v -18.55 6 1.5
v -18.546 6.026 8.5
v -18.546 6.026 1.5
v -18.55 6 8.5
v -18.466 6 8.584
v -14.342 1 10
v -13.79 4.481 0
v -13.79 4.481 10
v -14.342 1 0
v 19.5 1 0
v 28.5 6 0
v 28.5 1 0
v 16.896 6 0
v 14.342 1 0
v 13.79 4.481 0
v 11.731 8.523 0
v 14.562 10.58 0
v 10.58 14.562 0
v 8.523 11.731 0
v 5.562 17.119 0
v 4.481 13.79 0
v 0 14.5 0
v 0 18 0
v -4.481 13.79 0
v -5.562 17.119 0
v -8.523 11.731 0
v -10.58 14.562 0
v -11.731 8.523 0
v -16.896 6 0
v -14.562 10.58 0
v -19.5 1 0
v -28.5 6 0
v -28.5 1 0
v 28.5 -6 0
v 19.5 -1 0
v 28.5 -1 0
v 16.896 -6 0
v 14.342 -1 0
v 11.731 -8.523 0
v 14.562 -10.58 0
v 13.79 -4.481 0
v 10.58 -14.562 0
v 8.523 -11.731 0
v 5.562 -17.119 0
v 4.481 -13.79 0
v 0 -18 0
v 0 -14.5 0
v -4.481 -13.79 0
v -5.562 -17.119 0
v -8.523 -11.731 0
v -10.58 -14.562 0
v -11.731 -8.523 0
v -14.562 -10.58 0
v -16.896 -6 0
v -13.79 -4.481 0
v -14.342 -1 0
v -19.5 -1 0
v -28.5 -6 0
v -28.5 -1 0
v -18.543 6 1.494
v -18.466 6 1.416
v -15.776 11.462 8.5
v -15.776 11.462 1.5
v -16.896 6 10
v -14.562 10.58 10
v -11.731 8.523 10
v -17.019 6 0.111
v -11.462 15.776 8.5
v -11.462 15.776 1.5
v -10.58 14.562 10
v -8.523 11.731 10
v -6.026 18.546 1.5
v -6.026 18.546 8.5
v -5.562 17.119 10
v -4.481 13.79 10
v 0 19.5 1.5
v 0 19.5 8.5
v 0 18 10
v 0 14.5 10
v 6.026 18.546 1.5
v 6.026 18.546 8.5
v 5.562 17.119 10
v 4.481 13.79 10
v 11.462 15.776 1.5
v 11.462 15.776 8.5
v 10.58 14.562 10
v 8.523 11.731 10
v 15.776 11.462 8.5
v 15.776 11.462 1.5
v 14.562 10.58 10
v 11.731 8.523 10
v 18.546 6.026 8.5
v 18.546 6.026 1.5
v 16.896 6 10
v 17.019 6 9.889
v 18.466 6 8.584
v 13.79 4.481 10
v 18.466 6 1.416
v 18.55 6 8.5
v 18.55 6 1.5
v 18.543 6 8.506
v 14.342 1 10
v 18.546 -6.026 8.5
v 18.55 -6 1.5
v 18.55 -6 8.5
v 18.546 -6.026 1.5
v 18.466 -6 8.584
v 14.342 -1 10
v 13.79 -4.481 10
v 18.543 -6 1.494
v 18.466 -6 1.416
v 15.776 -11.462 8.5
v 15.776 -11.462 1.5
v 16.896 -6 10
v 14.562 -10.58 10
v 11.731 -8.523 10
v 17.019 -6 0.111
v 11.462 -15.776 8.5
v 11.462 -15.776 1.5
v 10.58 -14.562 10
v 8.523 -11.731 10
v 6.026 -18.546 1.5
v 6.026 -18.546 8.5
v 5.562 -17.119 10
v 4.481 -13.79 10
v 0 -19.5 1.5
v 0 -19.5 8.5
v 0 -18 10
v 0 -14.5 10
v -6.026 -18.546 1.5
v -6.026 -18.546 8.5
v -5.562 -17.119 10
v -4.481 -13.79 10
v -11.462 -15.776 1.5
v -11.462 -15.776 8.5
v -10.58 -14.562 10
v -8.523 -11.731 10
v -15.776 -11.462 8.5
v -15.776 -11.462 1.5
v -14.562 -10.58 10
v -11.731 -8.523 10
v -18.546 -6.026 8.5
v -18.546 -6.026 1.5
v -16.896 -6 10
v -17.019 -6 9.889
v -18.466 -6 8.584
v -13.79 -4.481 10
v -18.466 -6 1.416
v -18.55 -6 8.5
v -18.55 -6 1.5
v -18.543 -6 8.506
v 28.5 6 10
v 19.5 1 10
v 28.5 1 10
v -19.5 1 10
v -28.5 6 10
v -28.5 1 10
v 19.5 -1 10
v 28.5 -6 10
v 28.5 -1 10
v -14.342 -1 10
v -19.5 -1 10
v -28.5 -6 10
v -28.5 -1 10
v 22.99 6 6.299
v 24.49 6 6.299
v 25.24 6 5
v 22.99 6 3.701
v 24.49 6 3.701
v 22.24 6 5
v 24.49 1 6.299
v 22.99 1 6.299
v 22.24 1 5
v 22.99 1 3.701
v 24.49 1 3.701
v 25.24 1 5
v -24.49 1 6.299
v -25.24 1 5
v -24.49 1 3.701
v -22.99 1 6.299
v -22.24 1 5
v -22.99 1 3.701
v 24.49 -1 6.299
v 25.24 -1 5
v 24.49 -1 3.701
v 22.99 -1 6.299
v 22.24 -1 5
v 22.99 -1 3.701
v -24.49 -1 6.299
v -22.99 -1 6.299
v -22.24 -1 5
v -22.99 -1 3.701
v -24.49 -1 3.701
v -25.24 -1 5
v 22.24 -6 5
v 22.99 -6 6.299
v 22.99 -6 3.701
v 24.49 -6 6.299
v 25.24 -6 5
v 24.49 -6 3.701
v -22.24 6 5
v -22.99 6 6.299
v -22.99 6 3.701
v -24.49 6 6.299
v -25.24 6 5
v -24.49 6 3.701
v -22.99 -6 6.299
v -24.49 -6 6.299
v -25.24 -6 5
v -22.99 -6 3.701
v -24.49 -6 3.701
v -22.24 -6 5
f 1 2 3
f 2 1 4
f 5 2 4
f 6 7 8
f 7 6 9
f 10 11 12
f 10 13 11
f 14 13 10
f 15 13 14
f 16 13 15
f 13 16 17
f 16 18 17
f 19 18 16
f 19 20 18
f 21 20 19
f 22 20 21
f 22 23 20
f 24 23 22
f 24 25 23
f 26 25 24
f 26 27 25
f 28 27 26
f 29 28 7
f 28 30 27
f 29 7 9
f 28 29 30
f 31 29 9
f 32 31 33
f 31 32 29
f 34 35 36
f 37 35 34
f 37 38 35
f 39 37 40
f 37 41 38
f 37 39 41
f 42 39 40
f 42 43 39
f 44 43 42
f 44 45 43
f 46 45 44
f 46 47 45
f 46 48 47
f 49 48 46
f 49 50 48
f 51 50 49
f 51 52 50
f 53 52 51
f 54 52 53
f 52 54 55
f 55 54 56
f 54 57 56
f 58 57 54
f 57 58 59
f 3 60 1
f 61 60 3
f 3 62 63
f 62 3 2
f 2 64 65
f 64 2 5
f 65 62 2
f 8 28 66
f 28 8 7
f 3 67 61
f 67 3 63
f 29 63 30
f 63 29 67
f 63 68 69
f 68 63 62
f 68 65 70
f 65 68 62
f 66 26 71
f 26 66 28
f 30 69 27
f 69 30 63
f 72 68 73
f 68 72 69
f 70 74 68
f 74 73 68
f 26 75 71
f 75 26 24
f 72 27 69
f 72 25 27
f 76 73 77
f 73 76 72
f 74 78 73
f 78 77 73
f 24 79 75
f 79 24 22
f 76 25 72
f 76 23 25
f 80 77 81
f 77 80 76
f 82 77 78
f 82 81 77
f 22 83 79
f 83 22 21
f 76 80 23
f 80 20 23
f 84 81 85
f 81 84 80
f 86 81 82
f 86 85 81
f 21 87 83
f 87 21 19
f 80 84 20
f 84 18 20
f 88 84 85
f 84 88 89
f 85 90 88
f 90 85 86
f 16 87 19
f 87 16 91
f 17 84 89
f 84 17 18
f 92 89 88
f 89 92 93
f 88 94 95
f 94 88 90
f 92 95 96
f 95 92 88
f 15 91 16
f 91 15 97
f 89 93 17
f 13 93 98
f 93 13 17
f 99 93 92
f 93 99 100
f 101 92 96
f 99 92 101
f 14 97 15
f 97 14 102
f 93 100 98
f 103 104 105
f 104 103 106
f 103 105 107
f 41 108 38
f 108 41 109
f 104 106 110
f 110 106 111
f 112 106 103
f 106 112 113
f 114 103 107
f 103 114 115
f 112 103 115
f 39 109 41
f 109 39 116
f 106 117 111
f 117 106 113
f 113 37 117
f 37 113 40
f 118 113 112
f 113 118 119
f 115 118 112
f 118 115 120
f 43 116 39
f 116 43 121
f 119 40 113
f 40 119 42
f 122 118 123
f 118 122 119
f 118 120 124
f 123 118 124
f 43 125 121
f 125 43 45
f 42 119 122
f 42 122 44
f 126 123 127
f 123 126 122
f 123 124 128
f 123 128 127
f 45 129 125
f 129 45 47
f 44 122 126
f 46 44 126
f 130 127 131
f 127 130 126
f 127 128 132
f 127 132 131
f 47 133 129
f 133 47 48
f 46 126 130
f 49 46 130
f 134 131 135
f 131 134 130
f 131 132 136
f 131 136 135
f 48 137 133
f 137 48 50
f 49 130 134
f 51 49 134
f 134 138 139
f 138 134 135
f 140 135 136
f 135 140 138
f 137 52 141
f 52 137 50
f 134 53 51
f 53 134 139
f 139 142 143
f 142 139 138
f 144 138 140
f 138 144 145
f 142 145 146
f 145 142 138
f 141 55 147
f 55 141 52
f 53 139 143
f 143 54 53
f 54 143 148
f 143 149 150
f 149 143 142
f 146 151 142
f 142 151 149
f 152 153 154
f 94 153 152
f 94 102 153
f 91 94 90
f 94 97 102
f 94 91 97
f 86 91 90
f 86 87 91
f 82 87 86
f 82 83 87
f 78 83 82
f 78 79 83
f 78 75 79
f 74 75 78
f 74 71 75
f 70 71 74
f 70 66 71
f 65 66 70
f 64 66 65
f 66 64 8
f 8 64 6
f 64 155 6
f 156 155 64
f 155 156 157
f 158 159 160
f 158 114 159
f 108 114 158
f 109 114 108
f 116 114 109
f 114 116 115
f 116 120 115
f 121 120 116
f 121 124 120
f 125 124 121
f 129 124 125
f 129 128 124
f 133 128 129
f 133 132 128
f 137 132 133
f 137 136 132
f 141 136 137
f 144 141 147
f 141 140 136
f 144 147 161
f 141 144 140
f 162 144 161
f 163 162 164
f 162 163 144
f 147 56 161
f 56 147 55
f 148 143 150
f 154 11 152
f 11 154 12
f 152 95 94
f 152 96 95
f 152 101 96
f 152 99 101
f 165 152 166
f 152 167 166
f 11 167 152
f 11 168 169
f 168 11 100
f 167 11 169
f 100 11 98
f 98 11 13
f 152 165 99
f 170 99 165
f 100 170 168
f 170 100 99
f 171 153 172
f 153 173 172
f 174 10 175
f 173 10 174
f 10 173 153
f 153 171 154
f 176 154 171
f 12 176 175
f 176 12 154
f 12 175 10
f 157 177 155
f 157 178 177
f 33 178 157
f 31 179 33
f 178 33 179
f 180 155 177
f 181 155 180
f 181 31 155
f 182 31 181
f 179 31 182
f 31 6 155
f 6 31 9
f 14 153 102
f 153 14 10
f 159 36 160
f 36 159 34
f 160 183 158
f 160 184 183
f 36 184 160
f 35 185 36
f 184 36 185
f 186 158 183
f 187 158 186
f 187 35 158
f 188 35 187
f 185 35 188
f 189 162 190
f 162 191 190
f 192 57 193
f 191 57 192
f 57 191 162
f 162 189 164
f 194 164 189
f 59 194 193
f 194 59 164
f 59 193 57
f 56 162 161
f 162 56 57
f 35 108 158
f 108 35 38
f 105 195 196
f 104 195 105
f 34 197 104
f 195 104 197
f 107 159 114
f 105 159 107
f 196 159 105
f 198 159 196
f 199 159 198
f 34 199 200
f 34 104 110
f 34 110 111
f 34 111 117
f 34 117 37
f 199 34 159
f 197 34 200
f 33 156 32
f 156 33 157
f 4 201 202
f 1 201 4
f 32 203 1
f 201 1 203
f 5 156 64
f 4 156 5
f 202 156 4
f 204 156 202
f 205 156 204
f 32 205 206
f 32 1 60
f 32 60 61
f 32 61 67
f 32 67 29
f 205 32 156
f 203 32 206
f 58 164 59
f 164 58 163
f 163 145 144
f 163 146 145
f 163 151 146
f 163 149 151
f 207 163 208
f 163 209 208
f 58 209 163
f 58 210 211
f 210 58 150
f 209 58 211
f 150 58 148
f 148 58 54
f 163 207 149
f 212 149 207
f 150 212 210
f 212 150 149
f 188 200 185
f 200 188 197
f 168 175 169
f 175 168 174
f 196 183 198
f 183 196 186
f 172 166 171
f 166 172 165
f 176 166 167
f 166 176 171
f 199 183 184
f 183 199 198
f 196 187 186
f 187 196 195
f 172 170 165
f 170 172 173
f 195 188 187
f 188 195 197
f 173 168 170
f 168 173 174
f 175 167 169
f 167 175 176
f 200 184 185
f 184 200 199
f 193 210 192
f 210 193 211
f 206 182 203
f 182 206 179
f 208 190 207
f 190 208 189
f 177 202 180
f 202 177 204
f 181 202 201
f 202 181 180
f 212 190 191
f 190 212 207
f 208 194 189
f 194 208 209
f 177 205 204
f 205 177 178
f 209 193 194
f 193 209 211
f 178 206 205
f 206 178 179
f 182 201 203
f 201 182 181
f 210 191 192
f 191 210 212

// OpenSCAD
quality = 20; // 200 for final export...

c_post_size = 29;          			// Size of Bike post to fit (mine is 28mmx29mm)
c_gap = c_post_size / 2;

c_height = 10;							// How tall to make clamp side
c_thickness = 5;						// How thick (around post)
c_edge = 1.5;								// Bevel edge size

c_tab_mult = c_thickness * 2.8;		// Width of side tabs (relative)
c_hole_radius = 1.5;					// Radius of screw holes


difference()
{
	// Additive items within union...
	union()
	{

		// Main circle
		rotate_extrude($fn=quality)
			translate([c_gap, 0, 0])
				polygon( points=[[0,0],
					[c_thickness - c_edge, 0],
					[c_thickness, c_edge],
					[c_thickness, c_height-c_edge],
					[c_thickness - c_edge, c_height],
					[0, c_height]] );

		// 'left' tabs
		translate([c_gap, 1, 0])
			cube([c_tab_mult, c_thickness, c_height], center=false);
		translate([c_gap, - (c_thickness + 1), 0])
			cube([c_tab_mult, c_thickness, c_height], center=false);

		// 'right' tabs
		translate([-(c_gap + c_tab_mult), 1, 0])
			cube([c_tab_mult, c_thickness, c_height], center=false);
		translate([-(c_gap + c_tab_mult), - (c_thickness + 1), 0])
			cube([c_tab_mult, c_thickness, c_height], center=false);

	}

	// Subtractive 'difference' items below...

	// Split into two parts
	translate([-(c_thickness + c_gap), -1, 0])
		cube([(c_gap + c_thickness) * 2, 2, c_height], center=false);

	// Screw holes
	translate([c_gap + (c_tab_mult * .66), c_thickness + 1, (c_height / 2)])
		rotate([90, 0, 0])
			cylinder(c_thickness * 2 + 2, c_hole_radius, c_hole_radius, $fn=quality / 3);
	translate([-(c_gap + (c_tab_mult * .66)), c_thickness + 1, (c_height / 2)])
		rotate([90, 0, 0])
			cylinder(c_thickness * 2 + 2, c_hole_radius, c_hole_radius, $fn=quality / 3);

}
